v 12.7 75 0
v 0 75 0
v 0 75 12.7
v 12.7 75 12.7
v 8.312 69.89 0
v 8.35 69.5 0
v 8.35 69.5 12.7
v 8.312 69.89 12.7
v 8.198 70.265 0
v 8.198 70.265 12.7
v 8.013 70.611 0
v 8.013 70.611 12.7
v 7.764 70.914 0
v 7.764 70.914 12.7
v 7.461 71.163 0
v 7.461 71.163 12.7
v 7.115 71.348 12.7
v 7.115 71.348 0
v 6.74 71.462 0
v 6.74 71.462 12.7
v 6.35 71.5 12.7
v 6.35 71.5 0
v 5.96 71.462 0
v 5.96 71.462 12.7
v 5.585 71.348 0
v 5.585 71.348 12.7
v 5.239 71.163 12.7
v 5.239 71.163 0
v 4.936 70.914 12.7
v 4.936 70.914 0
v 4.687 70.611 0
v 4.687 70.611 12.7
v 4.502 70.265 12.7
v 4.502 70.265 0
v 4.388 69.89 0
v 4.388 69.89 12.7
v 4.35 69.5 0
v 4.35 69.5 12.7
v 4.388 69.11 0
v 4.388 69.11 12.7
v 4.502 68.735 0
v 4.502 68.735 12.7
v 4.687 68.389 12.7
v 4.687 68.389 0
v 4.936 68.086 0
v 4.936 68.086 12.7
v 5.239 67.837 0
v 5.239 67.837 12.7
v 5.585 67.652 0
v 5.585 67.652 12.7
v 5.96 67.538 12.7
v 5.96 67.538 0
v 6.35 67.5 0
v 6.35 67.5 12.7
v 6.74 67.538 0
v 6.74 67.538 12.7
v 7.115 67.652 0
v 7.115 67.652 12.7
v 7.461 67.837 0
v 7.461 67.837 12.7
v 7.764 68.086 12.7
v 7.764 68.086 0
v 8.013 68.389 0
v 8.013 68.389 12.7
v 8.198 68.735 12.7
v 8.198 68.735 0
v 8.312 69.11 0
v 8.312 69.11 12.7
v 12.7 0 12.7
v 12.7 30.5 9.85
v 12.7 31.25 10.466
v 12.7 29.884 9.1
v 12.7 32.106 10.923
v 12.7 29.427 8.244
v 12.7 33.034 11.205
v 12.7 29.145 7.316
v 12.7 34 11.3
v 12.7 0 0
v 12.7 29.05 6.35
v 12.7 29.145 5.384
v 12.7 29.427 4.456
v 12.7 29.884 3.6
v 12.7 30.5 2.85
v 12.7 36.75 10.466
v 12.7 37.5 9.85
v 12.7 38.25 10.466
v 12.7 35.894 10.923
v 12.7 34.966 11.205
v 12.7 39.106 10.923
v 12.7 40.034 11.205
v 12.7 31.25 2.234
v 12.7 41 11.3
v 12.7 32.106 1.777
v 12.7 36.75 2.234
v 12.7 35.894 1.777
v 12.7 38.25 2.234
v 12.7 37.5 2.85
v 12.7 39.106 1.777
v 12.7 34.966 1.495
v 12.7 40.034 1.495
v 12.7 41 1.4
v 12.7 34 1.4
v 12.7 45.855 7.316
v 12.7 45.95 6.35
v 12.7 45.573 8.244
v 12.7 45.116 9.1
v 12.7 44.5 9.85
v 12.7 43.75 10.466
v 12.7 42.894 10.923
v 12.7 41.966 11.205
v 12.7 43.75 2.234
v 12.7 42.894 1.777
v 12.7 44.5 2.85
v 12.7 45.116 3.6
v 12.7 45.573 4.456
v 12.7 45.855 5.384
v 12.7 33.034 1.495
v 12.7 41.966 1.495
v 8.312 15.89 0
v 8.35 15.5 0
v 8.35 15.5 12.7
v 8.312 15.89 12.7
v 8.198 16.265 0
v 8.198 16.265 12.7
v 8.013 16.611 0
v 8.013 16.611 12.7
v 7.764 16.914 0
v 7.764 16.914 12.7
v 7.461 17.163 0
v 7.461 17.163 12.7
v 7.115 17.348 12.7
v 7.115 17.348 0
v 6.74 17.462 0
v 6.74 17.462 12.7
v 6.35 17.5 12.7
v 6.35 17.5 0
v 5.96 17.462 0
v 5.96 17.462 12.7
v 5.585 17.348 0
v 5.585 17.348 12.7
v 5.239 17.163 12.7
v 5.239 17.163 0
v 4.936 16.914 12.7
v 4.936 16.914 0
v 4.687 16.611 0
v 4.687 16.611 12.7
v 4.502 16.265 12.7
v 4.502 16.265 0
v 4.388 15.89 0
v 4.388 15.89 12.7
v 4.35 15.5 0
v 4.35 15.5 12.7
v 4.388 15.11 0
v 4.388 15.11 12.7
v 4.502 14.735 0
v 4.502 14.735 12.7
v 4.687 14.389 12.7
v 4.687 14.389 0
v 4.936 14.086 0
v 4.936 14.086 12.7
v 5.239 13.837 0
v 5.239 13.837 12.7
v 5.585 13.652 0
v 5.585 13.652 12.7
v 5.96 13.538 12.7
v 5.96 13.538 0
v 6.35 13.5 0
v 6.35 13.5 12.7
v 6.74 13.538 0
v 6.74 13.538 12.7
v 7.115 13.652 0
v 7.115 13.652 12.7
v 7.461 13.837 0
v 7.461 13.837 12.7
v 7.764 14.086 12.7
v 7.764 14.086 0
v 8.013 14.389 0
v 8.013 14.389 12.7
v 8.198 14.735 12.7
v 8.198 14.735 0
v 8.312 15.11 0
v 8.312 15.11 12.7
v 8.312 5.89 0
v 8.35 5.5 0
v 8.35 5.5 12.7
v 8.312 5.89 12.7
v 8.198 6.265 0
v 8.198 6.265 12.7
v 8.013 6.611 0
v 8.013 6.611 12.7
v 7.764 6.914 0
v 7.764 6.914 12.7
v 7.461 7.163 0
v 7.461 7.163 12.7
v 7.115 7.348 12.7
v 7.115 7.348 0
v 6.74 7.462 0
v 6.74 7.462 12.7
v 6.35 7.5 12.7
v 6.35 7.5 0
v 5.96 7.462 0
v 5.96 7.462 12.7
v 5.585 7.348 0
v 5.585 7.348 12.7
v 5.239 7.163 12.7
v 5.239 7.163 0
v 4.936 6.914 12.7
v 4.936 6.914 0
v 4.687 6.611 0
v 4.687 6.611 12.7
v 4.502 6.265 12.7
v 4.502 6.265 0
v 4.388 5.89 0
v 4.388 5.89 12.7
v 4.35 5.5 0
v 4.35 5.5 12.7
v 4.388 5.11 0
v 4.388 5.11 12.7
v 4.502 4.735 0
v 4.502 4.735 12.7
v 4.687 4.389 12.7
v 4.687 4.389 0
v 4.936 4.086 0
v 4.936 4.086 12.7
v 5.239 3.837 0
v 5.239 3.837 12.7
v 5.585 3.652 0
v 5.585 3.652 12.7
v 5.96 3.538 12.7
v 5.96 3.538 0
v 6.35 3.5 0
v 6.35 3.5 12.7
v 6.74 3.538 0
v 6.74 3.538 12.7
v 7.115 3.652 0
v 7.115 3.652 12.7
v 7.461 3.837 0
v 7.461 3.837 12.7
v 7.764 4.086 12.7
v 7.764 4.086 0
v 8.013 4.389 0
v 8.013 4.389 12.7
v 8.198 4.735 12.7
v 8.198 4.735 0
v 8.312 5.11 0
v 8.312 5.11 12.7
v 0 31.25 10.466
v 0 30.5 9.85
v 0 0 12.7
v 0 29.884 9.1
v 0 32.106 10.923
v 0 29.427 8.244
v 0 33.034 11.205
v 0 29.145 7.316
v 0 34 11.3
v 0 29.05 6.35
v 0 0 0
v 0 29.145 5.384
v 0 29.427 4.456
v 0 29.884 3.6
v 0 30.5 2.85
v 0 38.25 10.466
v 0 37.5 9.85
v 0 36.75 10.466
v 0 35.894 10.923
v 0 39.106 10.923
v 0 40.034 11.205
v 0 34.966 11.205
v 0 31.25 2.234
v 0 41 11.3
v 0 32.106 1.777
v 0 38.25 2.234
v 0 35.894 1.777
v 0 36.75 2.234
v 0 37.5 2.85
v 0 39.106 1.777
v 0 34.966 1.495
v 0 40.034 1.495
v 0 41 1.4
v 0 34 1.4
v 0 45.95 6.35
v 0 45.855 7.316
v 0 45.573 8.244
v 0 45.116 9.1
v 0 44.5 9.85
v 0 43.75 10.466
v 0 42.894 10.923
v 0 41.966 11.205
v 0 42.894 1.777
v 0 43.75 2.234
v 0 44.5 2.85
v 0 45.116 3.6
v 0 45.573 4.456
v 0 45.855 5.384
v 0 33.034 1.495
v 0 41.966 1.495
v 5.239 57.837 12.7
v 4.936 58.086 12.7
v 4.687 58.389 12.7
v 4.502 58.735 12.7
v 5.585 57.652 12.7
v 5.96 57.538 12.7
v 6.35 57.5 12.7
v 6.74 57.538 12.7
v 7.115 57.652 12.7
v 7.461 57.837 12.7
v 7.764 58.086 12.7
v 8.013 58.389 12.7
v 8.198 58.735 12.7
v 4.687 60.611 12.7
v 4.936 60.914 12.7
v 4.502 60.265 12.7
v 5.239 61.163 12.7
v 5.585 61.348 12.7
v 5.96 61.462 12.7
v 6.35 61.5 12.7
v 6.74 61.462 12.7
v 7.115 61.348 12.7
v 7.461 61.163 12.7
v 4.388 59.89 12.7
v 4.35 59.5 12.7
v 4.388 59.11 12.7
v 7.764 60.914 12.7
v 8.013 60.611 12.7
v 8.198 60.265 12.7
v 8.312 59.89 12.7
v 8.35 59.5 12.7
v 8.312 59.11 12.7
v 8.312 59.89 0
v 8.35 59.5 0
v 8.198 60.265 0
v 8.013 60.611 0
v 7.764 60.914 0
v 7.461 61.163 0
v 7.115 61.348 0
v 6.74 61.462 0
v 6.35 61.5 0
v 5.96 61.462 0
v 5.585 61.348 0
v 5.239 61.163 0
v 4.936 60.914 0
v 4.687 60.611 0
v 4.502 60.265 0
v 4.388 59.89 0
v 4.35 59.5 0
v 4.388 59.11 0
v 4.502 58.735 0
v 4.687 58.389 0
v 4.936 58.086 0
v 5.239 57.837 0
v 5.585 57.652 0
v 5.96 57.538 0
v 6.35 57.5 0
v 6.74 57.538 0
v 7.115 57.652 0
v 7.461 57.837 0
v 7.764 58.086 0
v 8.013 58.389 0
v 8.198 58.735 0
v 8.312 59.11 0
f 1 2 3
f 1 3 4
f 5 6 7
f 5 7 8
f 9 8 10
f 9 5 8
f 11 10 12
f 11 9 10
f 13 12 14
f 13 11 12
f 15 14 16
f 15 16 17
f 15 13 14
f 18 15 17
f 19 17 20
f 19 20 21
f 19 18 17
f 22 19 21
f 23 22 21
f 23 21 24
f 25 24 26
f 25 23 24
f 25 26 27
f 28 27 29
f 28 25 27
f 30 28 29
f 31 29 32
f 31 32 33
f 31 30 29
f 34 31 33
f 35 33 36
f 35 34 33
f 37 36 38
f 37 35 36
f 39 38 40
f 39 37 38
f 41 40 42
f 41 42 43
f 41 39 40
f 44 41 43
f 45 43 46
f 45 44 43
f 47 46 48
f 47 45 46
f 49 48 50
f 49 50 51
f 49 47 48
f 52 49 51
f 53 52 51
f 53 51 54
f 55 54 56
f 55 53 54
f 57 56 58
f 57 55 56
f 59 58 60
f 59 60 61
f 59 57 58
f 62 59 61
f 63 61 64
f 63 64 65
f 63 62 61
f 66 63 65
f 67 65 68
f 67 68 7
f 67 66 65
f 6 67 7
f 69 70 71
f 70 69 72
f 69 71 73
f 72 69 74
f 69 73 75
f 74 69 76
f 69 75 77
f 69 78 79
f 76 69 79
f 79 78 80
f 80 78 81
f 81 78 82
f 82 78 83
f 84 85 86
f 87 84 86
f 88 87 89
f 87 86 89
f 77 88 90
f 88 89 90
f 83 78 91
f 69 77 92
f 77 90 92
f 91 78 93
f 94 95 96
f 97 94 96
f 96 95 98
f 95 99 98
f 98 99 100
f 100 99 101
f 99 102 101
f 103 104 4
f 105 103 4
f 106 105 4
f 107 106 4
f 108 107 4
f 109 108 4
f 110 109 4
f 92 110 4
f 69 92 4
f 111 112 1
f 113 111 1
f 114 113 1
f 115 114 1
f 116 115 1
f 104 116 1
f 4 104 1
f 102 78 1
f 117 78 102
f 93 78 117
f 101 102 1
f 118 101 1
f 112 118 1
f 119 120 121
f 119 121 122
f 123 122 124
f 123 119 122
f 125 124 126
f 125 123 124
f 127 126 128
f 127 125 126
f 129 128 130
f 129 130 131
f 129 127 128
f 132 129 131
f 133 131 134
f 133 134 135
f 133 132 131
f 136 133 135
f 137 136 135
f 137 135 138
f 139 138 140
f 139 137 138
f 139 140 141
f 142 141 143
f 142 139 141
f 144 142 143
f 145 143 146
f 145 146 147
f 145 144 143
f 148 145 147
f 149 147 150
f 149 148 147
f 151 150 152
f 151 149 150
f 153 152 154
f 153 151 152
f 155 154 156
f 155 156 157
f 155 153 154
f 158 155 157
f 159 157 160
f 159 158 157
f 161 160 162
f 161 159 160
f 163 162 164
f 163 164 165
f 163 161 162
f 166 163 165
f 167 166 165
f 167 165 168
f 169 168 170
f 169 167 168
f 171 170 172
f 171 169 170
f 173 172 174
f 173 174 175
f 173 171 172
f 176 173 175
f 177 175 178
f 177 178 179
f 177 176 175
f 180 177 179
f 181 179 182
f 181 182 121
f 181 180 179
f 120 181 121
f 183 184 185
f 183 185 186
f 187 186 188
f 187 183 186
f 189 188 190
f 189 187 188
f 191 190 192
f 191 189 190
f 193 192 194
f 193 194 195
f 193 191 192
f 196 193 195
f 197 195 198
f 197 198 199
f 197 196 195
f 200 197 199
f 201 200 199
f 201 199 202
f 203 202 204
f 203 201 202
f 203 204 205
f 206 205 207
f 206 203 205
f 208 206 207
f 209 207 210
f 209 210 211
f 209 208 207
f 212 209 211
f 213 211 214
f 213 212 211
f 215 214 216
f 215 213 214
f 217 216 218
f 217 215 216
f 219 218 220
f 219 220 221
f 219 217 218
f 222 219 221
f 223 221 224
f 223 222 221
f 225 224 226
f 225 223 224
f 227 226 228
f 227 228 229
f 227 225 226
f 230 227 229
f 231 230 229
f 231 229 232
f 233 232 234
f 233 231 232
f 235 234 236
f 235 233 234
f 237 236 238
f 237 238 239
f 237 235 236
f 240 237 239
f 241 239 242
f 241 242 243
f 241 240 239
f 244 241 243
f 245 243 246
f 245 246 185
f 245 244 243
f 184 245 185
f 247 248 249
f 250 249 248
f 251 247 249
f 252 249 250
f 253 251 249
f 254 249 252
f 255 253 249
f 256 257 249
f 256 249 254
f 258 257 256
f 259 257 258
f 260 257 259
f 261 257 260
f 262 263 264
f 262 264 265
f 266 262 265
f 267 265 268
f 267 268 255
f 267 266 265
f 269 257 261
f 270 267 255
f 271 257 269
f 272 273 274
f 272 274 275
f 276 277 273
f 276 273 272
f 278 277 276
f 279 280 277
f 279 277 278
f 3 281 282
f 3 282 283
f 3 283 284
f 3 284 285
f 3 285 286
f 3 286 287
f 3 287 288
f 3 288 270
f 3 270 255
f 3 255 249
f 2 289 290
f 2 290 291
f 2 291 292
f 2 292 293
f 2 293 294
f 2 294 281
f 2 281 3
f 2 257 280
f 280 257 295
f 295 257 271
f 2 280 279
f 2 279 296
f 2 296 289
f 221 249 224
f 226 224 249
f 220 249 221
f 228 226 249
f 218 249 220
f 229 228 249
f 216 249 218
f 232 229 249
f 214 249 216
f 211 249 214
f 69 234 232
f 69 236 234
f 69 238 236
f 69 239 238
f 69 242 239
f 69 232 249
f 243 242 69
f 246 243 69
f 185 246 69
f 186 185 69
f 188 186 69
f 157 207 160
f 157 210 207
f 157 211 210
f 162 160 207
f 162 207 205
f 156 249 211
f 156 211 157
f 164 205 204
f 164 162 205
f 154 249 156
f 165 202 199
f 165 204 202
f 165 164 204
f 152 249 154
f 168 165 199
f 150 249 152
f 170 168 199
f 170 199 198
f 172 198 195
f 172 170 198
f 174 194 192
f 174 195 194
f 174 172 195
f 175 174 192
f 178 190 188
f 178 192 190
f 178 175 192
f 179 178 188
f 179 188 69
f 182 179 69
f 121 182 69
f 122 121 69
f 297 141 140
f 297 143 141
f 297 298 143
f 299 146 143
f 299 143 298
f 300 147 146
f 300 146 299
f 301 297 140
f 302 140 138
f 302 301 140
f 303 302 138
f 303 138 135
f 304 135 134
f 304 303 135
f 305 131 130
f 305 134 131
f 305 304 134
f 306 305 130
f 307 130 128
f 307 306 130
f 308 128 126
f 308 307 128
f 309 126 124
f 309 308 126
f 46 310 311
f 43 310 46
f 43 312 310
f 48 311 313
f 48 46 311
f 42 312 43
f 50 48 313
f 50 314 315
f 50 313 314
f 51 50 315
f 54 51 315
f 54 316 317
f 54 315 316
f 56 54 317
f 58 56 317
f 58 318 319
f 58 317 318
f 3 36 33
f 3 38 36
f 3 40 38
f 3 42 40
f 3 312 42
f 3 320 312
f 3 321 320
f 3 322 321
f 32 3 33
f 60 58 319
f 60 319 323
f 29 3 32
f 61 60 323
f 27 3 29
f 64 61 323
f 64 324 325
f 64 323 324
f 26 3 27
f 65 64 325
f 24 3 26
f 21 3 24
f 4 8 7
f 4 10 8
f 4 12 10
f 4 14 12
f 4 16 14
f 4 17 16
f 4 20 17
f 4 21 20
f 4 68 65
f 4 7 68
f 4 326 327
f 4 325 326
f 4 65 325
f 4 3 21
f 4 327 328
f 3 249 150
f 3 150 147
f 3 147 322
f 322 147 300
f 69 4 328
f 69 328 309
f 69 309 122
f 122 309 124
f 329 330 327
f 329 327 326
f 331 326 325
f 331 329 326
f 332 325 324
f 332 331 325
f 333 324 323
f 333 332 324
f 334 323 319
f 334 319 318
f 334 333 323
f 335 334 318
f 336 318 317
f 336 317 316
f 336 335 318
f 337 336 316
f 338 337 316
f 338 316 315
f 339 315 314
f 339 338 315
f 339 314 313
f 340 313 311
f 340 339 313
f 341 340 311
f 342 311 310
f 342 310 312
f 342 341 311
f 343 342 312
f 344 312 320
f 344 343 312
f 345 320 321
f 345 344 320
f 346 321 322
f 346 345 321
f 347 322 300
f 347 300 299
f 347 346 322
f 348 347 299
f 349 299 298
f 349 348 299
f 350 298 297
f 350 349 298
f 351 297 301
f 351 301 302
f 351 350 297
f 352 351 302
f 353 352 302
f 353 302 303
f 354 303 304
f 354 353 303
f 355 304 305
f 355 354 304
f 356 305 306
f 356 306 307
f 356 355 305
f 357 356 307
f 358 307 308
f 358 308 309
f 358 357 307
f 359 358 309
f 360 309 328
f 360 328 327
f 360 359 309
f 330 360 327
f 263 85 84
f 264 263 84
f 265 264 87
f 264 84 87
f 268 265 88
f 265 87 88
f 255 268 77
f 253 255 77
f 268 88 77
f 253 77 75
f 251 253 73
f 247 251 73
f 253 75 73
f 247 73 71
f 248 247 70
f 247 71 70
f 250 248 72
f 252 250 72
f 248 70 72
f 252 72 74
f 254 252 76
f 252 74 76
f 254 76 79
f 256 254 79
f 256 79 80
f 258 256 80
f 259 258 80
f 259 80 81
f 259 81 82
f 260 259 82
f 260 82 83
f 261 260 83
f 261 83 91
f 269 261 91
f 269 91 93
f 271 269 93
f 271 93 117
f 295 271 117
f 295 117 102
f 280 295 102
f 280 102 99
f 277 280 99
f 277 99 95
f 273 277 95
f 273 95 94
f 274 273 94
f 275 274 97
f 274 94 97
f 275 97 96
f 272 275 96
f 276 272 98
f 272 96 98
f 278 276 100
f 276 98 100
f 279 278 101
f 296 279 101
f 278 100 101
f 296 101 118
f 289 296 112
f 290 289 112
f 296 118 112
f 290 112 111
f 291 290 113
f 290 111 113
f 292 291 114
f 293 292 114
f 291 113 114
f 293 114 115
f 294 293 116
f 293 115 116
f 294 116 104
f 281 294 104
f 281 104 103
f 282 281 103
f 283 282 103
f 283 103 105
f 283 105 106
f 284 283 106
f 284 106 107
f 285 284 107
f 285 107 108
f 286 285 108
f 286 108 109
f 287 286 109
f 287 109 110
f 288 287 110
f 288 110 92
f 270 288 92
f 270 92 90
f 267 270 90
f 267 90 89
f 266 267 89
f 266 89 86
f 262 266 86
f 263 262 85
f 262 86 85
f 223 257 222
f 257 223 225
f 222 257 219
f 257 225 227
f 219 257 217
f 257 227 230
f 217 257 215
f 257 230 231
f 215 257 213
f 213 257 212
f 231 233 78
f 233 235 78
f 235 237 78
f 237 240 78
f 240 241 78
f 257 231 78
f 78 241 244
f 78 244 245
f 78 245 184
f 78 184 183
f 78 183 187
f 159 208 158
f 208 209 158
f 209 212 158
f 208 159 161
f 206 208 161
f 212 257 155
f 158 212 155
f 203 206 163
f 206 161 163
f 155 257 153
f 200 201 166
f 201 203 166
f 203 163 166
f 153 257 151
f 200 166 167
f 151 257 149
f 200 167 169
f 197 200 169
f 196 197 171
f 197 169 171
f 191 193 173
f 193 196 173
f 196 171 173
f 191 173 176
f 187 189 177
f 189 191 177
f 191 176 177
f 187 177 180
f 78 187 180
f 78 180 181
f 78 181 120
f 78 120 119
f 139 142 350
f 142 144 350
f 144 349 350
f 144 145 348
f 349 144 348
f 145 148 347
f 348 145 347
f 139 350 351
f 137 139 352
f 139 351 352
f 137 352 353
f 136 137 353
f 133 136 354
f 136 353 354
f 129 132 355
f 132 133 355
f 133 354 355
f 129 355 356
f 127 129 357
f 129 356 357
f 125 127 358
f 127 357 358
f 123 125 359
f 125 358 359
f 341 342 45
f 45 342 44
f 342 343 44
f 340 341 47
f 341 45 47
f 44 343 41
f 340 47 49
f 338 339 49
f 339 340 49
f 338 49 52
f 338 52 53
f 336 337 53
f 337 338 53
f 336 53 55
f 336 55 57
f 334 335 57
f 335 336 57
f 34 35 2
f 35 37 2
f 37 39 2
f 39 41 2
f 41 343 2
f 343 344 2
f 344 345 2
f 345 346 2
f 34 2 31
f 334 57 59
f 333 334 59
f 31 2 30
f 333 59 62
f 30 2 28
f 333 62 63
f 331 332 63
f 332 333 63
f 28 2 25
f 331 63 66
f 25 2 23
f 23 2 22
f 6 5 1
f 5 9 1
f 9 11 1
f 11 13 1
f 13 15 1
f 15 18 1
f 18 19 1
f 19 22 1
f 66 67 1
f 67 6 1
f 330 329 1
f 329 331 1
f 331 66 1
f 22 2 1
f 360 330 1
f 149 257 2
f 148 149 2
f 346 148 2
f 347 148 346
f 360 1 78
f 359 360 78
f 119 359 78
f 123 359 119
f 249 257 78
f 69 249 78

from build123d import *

# Parameters (mm, degrees)
SKETCH_W     = 12.7
SKETCH_H     = 75
SKETCH_R     = 2
PAD_DEPTH    = 12.7
POCKET_DEPTH = 12.701


with BuildPart() as part:
    # Sketch → Pad (new body)
    with BuildSketch(Plane.XY):
        with Locations((6.35, 37.5)):
            Rectangle(SKETCH_W, SKETCH_H)
        with Locations((6.35, 69.5)):
            Circle(SKETCH_R, mode=Mode.SUBTRACT)
        with Locations((6.35, 59.5)):
            Circle(SKETCH_R, mode=Mode.SUBTRACT)
        with Locations((6.35, 15.5)):
            Circle(SKETCH_R, mode=Mode.SUBTRACT)
        with Locations((6.35, 5.5)):
            Circle(SKETCH_R, mode=Mode.SUBTRACT)
    extrude(amount=PAD_DEPTH)

    # Sketch001 (on Face2 of Pad) → Pocket (cut, through all)
    with BuildSketch(Plane.YZ.offset(12.7)):
        with BuildLine():
            ThreePointArc((37.5, 2.85), (45.949747, 6.35), (37.5, 9.85))
            ThreePointArc((37.5, 9.85), (29.050253, 6.35), (37.5, 2.85))
        make_face()
    extrude(amount=-POCKET_DEPTH, mode=Mode.SUBTRACT)


solid = part.part
